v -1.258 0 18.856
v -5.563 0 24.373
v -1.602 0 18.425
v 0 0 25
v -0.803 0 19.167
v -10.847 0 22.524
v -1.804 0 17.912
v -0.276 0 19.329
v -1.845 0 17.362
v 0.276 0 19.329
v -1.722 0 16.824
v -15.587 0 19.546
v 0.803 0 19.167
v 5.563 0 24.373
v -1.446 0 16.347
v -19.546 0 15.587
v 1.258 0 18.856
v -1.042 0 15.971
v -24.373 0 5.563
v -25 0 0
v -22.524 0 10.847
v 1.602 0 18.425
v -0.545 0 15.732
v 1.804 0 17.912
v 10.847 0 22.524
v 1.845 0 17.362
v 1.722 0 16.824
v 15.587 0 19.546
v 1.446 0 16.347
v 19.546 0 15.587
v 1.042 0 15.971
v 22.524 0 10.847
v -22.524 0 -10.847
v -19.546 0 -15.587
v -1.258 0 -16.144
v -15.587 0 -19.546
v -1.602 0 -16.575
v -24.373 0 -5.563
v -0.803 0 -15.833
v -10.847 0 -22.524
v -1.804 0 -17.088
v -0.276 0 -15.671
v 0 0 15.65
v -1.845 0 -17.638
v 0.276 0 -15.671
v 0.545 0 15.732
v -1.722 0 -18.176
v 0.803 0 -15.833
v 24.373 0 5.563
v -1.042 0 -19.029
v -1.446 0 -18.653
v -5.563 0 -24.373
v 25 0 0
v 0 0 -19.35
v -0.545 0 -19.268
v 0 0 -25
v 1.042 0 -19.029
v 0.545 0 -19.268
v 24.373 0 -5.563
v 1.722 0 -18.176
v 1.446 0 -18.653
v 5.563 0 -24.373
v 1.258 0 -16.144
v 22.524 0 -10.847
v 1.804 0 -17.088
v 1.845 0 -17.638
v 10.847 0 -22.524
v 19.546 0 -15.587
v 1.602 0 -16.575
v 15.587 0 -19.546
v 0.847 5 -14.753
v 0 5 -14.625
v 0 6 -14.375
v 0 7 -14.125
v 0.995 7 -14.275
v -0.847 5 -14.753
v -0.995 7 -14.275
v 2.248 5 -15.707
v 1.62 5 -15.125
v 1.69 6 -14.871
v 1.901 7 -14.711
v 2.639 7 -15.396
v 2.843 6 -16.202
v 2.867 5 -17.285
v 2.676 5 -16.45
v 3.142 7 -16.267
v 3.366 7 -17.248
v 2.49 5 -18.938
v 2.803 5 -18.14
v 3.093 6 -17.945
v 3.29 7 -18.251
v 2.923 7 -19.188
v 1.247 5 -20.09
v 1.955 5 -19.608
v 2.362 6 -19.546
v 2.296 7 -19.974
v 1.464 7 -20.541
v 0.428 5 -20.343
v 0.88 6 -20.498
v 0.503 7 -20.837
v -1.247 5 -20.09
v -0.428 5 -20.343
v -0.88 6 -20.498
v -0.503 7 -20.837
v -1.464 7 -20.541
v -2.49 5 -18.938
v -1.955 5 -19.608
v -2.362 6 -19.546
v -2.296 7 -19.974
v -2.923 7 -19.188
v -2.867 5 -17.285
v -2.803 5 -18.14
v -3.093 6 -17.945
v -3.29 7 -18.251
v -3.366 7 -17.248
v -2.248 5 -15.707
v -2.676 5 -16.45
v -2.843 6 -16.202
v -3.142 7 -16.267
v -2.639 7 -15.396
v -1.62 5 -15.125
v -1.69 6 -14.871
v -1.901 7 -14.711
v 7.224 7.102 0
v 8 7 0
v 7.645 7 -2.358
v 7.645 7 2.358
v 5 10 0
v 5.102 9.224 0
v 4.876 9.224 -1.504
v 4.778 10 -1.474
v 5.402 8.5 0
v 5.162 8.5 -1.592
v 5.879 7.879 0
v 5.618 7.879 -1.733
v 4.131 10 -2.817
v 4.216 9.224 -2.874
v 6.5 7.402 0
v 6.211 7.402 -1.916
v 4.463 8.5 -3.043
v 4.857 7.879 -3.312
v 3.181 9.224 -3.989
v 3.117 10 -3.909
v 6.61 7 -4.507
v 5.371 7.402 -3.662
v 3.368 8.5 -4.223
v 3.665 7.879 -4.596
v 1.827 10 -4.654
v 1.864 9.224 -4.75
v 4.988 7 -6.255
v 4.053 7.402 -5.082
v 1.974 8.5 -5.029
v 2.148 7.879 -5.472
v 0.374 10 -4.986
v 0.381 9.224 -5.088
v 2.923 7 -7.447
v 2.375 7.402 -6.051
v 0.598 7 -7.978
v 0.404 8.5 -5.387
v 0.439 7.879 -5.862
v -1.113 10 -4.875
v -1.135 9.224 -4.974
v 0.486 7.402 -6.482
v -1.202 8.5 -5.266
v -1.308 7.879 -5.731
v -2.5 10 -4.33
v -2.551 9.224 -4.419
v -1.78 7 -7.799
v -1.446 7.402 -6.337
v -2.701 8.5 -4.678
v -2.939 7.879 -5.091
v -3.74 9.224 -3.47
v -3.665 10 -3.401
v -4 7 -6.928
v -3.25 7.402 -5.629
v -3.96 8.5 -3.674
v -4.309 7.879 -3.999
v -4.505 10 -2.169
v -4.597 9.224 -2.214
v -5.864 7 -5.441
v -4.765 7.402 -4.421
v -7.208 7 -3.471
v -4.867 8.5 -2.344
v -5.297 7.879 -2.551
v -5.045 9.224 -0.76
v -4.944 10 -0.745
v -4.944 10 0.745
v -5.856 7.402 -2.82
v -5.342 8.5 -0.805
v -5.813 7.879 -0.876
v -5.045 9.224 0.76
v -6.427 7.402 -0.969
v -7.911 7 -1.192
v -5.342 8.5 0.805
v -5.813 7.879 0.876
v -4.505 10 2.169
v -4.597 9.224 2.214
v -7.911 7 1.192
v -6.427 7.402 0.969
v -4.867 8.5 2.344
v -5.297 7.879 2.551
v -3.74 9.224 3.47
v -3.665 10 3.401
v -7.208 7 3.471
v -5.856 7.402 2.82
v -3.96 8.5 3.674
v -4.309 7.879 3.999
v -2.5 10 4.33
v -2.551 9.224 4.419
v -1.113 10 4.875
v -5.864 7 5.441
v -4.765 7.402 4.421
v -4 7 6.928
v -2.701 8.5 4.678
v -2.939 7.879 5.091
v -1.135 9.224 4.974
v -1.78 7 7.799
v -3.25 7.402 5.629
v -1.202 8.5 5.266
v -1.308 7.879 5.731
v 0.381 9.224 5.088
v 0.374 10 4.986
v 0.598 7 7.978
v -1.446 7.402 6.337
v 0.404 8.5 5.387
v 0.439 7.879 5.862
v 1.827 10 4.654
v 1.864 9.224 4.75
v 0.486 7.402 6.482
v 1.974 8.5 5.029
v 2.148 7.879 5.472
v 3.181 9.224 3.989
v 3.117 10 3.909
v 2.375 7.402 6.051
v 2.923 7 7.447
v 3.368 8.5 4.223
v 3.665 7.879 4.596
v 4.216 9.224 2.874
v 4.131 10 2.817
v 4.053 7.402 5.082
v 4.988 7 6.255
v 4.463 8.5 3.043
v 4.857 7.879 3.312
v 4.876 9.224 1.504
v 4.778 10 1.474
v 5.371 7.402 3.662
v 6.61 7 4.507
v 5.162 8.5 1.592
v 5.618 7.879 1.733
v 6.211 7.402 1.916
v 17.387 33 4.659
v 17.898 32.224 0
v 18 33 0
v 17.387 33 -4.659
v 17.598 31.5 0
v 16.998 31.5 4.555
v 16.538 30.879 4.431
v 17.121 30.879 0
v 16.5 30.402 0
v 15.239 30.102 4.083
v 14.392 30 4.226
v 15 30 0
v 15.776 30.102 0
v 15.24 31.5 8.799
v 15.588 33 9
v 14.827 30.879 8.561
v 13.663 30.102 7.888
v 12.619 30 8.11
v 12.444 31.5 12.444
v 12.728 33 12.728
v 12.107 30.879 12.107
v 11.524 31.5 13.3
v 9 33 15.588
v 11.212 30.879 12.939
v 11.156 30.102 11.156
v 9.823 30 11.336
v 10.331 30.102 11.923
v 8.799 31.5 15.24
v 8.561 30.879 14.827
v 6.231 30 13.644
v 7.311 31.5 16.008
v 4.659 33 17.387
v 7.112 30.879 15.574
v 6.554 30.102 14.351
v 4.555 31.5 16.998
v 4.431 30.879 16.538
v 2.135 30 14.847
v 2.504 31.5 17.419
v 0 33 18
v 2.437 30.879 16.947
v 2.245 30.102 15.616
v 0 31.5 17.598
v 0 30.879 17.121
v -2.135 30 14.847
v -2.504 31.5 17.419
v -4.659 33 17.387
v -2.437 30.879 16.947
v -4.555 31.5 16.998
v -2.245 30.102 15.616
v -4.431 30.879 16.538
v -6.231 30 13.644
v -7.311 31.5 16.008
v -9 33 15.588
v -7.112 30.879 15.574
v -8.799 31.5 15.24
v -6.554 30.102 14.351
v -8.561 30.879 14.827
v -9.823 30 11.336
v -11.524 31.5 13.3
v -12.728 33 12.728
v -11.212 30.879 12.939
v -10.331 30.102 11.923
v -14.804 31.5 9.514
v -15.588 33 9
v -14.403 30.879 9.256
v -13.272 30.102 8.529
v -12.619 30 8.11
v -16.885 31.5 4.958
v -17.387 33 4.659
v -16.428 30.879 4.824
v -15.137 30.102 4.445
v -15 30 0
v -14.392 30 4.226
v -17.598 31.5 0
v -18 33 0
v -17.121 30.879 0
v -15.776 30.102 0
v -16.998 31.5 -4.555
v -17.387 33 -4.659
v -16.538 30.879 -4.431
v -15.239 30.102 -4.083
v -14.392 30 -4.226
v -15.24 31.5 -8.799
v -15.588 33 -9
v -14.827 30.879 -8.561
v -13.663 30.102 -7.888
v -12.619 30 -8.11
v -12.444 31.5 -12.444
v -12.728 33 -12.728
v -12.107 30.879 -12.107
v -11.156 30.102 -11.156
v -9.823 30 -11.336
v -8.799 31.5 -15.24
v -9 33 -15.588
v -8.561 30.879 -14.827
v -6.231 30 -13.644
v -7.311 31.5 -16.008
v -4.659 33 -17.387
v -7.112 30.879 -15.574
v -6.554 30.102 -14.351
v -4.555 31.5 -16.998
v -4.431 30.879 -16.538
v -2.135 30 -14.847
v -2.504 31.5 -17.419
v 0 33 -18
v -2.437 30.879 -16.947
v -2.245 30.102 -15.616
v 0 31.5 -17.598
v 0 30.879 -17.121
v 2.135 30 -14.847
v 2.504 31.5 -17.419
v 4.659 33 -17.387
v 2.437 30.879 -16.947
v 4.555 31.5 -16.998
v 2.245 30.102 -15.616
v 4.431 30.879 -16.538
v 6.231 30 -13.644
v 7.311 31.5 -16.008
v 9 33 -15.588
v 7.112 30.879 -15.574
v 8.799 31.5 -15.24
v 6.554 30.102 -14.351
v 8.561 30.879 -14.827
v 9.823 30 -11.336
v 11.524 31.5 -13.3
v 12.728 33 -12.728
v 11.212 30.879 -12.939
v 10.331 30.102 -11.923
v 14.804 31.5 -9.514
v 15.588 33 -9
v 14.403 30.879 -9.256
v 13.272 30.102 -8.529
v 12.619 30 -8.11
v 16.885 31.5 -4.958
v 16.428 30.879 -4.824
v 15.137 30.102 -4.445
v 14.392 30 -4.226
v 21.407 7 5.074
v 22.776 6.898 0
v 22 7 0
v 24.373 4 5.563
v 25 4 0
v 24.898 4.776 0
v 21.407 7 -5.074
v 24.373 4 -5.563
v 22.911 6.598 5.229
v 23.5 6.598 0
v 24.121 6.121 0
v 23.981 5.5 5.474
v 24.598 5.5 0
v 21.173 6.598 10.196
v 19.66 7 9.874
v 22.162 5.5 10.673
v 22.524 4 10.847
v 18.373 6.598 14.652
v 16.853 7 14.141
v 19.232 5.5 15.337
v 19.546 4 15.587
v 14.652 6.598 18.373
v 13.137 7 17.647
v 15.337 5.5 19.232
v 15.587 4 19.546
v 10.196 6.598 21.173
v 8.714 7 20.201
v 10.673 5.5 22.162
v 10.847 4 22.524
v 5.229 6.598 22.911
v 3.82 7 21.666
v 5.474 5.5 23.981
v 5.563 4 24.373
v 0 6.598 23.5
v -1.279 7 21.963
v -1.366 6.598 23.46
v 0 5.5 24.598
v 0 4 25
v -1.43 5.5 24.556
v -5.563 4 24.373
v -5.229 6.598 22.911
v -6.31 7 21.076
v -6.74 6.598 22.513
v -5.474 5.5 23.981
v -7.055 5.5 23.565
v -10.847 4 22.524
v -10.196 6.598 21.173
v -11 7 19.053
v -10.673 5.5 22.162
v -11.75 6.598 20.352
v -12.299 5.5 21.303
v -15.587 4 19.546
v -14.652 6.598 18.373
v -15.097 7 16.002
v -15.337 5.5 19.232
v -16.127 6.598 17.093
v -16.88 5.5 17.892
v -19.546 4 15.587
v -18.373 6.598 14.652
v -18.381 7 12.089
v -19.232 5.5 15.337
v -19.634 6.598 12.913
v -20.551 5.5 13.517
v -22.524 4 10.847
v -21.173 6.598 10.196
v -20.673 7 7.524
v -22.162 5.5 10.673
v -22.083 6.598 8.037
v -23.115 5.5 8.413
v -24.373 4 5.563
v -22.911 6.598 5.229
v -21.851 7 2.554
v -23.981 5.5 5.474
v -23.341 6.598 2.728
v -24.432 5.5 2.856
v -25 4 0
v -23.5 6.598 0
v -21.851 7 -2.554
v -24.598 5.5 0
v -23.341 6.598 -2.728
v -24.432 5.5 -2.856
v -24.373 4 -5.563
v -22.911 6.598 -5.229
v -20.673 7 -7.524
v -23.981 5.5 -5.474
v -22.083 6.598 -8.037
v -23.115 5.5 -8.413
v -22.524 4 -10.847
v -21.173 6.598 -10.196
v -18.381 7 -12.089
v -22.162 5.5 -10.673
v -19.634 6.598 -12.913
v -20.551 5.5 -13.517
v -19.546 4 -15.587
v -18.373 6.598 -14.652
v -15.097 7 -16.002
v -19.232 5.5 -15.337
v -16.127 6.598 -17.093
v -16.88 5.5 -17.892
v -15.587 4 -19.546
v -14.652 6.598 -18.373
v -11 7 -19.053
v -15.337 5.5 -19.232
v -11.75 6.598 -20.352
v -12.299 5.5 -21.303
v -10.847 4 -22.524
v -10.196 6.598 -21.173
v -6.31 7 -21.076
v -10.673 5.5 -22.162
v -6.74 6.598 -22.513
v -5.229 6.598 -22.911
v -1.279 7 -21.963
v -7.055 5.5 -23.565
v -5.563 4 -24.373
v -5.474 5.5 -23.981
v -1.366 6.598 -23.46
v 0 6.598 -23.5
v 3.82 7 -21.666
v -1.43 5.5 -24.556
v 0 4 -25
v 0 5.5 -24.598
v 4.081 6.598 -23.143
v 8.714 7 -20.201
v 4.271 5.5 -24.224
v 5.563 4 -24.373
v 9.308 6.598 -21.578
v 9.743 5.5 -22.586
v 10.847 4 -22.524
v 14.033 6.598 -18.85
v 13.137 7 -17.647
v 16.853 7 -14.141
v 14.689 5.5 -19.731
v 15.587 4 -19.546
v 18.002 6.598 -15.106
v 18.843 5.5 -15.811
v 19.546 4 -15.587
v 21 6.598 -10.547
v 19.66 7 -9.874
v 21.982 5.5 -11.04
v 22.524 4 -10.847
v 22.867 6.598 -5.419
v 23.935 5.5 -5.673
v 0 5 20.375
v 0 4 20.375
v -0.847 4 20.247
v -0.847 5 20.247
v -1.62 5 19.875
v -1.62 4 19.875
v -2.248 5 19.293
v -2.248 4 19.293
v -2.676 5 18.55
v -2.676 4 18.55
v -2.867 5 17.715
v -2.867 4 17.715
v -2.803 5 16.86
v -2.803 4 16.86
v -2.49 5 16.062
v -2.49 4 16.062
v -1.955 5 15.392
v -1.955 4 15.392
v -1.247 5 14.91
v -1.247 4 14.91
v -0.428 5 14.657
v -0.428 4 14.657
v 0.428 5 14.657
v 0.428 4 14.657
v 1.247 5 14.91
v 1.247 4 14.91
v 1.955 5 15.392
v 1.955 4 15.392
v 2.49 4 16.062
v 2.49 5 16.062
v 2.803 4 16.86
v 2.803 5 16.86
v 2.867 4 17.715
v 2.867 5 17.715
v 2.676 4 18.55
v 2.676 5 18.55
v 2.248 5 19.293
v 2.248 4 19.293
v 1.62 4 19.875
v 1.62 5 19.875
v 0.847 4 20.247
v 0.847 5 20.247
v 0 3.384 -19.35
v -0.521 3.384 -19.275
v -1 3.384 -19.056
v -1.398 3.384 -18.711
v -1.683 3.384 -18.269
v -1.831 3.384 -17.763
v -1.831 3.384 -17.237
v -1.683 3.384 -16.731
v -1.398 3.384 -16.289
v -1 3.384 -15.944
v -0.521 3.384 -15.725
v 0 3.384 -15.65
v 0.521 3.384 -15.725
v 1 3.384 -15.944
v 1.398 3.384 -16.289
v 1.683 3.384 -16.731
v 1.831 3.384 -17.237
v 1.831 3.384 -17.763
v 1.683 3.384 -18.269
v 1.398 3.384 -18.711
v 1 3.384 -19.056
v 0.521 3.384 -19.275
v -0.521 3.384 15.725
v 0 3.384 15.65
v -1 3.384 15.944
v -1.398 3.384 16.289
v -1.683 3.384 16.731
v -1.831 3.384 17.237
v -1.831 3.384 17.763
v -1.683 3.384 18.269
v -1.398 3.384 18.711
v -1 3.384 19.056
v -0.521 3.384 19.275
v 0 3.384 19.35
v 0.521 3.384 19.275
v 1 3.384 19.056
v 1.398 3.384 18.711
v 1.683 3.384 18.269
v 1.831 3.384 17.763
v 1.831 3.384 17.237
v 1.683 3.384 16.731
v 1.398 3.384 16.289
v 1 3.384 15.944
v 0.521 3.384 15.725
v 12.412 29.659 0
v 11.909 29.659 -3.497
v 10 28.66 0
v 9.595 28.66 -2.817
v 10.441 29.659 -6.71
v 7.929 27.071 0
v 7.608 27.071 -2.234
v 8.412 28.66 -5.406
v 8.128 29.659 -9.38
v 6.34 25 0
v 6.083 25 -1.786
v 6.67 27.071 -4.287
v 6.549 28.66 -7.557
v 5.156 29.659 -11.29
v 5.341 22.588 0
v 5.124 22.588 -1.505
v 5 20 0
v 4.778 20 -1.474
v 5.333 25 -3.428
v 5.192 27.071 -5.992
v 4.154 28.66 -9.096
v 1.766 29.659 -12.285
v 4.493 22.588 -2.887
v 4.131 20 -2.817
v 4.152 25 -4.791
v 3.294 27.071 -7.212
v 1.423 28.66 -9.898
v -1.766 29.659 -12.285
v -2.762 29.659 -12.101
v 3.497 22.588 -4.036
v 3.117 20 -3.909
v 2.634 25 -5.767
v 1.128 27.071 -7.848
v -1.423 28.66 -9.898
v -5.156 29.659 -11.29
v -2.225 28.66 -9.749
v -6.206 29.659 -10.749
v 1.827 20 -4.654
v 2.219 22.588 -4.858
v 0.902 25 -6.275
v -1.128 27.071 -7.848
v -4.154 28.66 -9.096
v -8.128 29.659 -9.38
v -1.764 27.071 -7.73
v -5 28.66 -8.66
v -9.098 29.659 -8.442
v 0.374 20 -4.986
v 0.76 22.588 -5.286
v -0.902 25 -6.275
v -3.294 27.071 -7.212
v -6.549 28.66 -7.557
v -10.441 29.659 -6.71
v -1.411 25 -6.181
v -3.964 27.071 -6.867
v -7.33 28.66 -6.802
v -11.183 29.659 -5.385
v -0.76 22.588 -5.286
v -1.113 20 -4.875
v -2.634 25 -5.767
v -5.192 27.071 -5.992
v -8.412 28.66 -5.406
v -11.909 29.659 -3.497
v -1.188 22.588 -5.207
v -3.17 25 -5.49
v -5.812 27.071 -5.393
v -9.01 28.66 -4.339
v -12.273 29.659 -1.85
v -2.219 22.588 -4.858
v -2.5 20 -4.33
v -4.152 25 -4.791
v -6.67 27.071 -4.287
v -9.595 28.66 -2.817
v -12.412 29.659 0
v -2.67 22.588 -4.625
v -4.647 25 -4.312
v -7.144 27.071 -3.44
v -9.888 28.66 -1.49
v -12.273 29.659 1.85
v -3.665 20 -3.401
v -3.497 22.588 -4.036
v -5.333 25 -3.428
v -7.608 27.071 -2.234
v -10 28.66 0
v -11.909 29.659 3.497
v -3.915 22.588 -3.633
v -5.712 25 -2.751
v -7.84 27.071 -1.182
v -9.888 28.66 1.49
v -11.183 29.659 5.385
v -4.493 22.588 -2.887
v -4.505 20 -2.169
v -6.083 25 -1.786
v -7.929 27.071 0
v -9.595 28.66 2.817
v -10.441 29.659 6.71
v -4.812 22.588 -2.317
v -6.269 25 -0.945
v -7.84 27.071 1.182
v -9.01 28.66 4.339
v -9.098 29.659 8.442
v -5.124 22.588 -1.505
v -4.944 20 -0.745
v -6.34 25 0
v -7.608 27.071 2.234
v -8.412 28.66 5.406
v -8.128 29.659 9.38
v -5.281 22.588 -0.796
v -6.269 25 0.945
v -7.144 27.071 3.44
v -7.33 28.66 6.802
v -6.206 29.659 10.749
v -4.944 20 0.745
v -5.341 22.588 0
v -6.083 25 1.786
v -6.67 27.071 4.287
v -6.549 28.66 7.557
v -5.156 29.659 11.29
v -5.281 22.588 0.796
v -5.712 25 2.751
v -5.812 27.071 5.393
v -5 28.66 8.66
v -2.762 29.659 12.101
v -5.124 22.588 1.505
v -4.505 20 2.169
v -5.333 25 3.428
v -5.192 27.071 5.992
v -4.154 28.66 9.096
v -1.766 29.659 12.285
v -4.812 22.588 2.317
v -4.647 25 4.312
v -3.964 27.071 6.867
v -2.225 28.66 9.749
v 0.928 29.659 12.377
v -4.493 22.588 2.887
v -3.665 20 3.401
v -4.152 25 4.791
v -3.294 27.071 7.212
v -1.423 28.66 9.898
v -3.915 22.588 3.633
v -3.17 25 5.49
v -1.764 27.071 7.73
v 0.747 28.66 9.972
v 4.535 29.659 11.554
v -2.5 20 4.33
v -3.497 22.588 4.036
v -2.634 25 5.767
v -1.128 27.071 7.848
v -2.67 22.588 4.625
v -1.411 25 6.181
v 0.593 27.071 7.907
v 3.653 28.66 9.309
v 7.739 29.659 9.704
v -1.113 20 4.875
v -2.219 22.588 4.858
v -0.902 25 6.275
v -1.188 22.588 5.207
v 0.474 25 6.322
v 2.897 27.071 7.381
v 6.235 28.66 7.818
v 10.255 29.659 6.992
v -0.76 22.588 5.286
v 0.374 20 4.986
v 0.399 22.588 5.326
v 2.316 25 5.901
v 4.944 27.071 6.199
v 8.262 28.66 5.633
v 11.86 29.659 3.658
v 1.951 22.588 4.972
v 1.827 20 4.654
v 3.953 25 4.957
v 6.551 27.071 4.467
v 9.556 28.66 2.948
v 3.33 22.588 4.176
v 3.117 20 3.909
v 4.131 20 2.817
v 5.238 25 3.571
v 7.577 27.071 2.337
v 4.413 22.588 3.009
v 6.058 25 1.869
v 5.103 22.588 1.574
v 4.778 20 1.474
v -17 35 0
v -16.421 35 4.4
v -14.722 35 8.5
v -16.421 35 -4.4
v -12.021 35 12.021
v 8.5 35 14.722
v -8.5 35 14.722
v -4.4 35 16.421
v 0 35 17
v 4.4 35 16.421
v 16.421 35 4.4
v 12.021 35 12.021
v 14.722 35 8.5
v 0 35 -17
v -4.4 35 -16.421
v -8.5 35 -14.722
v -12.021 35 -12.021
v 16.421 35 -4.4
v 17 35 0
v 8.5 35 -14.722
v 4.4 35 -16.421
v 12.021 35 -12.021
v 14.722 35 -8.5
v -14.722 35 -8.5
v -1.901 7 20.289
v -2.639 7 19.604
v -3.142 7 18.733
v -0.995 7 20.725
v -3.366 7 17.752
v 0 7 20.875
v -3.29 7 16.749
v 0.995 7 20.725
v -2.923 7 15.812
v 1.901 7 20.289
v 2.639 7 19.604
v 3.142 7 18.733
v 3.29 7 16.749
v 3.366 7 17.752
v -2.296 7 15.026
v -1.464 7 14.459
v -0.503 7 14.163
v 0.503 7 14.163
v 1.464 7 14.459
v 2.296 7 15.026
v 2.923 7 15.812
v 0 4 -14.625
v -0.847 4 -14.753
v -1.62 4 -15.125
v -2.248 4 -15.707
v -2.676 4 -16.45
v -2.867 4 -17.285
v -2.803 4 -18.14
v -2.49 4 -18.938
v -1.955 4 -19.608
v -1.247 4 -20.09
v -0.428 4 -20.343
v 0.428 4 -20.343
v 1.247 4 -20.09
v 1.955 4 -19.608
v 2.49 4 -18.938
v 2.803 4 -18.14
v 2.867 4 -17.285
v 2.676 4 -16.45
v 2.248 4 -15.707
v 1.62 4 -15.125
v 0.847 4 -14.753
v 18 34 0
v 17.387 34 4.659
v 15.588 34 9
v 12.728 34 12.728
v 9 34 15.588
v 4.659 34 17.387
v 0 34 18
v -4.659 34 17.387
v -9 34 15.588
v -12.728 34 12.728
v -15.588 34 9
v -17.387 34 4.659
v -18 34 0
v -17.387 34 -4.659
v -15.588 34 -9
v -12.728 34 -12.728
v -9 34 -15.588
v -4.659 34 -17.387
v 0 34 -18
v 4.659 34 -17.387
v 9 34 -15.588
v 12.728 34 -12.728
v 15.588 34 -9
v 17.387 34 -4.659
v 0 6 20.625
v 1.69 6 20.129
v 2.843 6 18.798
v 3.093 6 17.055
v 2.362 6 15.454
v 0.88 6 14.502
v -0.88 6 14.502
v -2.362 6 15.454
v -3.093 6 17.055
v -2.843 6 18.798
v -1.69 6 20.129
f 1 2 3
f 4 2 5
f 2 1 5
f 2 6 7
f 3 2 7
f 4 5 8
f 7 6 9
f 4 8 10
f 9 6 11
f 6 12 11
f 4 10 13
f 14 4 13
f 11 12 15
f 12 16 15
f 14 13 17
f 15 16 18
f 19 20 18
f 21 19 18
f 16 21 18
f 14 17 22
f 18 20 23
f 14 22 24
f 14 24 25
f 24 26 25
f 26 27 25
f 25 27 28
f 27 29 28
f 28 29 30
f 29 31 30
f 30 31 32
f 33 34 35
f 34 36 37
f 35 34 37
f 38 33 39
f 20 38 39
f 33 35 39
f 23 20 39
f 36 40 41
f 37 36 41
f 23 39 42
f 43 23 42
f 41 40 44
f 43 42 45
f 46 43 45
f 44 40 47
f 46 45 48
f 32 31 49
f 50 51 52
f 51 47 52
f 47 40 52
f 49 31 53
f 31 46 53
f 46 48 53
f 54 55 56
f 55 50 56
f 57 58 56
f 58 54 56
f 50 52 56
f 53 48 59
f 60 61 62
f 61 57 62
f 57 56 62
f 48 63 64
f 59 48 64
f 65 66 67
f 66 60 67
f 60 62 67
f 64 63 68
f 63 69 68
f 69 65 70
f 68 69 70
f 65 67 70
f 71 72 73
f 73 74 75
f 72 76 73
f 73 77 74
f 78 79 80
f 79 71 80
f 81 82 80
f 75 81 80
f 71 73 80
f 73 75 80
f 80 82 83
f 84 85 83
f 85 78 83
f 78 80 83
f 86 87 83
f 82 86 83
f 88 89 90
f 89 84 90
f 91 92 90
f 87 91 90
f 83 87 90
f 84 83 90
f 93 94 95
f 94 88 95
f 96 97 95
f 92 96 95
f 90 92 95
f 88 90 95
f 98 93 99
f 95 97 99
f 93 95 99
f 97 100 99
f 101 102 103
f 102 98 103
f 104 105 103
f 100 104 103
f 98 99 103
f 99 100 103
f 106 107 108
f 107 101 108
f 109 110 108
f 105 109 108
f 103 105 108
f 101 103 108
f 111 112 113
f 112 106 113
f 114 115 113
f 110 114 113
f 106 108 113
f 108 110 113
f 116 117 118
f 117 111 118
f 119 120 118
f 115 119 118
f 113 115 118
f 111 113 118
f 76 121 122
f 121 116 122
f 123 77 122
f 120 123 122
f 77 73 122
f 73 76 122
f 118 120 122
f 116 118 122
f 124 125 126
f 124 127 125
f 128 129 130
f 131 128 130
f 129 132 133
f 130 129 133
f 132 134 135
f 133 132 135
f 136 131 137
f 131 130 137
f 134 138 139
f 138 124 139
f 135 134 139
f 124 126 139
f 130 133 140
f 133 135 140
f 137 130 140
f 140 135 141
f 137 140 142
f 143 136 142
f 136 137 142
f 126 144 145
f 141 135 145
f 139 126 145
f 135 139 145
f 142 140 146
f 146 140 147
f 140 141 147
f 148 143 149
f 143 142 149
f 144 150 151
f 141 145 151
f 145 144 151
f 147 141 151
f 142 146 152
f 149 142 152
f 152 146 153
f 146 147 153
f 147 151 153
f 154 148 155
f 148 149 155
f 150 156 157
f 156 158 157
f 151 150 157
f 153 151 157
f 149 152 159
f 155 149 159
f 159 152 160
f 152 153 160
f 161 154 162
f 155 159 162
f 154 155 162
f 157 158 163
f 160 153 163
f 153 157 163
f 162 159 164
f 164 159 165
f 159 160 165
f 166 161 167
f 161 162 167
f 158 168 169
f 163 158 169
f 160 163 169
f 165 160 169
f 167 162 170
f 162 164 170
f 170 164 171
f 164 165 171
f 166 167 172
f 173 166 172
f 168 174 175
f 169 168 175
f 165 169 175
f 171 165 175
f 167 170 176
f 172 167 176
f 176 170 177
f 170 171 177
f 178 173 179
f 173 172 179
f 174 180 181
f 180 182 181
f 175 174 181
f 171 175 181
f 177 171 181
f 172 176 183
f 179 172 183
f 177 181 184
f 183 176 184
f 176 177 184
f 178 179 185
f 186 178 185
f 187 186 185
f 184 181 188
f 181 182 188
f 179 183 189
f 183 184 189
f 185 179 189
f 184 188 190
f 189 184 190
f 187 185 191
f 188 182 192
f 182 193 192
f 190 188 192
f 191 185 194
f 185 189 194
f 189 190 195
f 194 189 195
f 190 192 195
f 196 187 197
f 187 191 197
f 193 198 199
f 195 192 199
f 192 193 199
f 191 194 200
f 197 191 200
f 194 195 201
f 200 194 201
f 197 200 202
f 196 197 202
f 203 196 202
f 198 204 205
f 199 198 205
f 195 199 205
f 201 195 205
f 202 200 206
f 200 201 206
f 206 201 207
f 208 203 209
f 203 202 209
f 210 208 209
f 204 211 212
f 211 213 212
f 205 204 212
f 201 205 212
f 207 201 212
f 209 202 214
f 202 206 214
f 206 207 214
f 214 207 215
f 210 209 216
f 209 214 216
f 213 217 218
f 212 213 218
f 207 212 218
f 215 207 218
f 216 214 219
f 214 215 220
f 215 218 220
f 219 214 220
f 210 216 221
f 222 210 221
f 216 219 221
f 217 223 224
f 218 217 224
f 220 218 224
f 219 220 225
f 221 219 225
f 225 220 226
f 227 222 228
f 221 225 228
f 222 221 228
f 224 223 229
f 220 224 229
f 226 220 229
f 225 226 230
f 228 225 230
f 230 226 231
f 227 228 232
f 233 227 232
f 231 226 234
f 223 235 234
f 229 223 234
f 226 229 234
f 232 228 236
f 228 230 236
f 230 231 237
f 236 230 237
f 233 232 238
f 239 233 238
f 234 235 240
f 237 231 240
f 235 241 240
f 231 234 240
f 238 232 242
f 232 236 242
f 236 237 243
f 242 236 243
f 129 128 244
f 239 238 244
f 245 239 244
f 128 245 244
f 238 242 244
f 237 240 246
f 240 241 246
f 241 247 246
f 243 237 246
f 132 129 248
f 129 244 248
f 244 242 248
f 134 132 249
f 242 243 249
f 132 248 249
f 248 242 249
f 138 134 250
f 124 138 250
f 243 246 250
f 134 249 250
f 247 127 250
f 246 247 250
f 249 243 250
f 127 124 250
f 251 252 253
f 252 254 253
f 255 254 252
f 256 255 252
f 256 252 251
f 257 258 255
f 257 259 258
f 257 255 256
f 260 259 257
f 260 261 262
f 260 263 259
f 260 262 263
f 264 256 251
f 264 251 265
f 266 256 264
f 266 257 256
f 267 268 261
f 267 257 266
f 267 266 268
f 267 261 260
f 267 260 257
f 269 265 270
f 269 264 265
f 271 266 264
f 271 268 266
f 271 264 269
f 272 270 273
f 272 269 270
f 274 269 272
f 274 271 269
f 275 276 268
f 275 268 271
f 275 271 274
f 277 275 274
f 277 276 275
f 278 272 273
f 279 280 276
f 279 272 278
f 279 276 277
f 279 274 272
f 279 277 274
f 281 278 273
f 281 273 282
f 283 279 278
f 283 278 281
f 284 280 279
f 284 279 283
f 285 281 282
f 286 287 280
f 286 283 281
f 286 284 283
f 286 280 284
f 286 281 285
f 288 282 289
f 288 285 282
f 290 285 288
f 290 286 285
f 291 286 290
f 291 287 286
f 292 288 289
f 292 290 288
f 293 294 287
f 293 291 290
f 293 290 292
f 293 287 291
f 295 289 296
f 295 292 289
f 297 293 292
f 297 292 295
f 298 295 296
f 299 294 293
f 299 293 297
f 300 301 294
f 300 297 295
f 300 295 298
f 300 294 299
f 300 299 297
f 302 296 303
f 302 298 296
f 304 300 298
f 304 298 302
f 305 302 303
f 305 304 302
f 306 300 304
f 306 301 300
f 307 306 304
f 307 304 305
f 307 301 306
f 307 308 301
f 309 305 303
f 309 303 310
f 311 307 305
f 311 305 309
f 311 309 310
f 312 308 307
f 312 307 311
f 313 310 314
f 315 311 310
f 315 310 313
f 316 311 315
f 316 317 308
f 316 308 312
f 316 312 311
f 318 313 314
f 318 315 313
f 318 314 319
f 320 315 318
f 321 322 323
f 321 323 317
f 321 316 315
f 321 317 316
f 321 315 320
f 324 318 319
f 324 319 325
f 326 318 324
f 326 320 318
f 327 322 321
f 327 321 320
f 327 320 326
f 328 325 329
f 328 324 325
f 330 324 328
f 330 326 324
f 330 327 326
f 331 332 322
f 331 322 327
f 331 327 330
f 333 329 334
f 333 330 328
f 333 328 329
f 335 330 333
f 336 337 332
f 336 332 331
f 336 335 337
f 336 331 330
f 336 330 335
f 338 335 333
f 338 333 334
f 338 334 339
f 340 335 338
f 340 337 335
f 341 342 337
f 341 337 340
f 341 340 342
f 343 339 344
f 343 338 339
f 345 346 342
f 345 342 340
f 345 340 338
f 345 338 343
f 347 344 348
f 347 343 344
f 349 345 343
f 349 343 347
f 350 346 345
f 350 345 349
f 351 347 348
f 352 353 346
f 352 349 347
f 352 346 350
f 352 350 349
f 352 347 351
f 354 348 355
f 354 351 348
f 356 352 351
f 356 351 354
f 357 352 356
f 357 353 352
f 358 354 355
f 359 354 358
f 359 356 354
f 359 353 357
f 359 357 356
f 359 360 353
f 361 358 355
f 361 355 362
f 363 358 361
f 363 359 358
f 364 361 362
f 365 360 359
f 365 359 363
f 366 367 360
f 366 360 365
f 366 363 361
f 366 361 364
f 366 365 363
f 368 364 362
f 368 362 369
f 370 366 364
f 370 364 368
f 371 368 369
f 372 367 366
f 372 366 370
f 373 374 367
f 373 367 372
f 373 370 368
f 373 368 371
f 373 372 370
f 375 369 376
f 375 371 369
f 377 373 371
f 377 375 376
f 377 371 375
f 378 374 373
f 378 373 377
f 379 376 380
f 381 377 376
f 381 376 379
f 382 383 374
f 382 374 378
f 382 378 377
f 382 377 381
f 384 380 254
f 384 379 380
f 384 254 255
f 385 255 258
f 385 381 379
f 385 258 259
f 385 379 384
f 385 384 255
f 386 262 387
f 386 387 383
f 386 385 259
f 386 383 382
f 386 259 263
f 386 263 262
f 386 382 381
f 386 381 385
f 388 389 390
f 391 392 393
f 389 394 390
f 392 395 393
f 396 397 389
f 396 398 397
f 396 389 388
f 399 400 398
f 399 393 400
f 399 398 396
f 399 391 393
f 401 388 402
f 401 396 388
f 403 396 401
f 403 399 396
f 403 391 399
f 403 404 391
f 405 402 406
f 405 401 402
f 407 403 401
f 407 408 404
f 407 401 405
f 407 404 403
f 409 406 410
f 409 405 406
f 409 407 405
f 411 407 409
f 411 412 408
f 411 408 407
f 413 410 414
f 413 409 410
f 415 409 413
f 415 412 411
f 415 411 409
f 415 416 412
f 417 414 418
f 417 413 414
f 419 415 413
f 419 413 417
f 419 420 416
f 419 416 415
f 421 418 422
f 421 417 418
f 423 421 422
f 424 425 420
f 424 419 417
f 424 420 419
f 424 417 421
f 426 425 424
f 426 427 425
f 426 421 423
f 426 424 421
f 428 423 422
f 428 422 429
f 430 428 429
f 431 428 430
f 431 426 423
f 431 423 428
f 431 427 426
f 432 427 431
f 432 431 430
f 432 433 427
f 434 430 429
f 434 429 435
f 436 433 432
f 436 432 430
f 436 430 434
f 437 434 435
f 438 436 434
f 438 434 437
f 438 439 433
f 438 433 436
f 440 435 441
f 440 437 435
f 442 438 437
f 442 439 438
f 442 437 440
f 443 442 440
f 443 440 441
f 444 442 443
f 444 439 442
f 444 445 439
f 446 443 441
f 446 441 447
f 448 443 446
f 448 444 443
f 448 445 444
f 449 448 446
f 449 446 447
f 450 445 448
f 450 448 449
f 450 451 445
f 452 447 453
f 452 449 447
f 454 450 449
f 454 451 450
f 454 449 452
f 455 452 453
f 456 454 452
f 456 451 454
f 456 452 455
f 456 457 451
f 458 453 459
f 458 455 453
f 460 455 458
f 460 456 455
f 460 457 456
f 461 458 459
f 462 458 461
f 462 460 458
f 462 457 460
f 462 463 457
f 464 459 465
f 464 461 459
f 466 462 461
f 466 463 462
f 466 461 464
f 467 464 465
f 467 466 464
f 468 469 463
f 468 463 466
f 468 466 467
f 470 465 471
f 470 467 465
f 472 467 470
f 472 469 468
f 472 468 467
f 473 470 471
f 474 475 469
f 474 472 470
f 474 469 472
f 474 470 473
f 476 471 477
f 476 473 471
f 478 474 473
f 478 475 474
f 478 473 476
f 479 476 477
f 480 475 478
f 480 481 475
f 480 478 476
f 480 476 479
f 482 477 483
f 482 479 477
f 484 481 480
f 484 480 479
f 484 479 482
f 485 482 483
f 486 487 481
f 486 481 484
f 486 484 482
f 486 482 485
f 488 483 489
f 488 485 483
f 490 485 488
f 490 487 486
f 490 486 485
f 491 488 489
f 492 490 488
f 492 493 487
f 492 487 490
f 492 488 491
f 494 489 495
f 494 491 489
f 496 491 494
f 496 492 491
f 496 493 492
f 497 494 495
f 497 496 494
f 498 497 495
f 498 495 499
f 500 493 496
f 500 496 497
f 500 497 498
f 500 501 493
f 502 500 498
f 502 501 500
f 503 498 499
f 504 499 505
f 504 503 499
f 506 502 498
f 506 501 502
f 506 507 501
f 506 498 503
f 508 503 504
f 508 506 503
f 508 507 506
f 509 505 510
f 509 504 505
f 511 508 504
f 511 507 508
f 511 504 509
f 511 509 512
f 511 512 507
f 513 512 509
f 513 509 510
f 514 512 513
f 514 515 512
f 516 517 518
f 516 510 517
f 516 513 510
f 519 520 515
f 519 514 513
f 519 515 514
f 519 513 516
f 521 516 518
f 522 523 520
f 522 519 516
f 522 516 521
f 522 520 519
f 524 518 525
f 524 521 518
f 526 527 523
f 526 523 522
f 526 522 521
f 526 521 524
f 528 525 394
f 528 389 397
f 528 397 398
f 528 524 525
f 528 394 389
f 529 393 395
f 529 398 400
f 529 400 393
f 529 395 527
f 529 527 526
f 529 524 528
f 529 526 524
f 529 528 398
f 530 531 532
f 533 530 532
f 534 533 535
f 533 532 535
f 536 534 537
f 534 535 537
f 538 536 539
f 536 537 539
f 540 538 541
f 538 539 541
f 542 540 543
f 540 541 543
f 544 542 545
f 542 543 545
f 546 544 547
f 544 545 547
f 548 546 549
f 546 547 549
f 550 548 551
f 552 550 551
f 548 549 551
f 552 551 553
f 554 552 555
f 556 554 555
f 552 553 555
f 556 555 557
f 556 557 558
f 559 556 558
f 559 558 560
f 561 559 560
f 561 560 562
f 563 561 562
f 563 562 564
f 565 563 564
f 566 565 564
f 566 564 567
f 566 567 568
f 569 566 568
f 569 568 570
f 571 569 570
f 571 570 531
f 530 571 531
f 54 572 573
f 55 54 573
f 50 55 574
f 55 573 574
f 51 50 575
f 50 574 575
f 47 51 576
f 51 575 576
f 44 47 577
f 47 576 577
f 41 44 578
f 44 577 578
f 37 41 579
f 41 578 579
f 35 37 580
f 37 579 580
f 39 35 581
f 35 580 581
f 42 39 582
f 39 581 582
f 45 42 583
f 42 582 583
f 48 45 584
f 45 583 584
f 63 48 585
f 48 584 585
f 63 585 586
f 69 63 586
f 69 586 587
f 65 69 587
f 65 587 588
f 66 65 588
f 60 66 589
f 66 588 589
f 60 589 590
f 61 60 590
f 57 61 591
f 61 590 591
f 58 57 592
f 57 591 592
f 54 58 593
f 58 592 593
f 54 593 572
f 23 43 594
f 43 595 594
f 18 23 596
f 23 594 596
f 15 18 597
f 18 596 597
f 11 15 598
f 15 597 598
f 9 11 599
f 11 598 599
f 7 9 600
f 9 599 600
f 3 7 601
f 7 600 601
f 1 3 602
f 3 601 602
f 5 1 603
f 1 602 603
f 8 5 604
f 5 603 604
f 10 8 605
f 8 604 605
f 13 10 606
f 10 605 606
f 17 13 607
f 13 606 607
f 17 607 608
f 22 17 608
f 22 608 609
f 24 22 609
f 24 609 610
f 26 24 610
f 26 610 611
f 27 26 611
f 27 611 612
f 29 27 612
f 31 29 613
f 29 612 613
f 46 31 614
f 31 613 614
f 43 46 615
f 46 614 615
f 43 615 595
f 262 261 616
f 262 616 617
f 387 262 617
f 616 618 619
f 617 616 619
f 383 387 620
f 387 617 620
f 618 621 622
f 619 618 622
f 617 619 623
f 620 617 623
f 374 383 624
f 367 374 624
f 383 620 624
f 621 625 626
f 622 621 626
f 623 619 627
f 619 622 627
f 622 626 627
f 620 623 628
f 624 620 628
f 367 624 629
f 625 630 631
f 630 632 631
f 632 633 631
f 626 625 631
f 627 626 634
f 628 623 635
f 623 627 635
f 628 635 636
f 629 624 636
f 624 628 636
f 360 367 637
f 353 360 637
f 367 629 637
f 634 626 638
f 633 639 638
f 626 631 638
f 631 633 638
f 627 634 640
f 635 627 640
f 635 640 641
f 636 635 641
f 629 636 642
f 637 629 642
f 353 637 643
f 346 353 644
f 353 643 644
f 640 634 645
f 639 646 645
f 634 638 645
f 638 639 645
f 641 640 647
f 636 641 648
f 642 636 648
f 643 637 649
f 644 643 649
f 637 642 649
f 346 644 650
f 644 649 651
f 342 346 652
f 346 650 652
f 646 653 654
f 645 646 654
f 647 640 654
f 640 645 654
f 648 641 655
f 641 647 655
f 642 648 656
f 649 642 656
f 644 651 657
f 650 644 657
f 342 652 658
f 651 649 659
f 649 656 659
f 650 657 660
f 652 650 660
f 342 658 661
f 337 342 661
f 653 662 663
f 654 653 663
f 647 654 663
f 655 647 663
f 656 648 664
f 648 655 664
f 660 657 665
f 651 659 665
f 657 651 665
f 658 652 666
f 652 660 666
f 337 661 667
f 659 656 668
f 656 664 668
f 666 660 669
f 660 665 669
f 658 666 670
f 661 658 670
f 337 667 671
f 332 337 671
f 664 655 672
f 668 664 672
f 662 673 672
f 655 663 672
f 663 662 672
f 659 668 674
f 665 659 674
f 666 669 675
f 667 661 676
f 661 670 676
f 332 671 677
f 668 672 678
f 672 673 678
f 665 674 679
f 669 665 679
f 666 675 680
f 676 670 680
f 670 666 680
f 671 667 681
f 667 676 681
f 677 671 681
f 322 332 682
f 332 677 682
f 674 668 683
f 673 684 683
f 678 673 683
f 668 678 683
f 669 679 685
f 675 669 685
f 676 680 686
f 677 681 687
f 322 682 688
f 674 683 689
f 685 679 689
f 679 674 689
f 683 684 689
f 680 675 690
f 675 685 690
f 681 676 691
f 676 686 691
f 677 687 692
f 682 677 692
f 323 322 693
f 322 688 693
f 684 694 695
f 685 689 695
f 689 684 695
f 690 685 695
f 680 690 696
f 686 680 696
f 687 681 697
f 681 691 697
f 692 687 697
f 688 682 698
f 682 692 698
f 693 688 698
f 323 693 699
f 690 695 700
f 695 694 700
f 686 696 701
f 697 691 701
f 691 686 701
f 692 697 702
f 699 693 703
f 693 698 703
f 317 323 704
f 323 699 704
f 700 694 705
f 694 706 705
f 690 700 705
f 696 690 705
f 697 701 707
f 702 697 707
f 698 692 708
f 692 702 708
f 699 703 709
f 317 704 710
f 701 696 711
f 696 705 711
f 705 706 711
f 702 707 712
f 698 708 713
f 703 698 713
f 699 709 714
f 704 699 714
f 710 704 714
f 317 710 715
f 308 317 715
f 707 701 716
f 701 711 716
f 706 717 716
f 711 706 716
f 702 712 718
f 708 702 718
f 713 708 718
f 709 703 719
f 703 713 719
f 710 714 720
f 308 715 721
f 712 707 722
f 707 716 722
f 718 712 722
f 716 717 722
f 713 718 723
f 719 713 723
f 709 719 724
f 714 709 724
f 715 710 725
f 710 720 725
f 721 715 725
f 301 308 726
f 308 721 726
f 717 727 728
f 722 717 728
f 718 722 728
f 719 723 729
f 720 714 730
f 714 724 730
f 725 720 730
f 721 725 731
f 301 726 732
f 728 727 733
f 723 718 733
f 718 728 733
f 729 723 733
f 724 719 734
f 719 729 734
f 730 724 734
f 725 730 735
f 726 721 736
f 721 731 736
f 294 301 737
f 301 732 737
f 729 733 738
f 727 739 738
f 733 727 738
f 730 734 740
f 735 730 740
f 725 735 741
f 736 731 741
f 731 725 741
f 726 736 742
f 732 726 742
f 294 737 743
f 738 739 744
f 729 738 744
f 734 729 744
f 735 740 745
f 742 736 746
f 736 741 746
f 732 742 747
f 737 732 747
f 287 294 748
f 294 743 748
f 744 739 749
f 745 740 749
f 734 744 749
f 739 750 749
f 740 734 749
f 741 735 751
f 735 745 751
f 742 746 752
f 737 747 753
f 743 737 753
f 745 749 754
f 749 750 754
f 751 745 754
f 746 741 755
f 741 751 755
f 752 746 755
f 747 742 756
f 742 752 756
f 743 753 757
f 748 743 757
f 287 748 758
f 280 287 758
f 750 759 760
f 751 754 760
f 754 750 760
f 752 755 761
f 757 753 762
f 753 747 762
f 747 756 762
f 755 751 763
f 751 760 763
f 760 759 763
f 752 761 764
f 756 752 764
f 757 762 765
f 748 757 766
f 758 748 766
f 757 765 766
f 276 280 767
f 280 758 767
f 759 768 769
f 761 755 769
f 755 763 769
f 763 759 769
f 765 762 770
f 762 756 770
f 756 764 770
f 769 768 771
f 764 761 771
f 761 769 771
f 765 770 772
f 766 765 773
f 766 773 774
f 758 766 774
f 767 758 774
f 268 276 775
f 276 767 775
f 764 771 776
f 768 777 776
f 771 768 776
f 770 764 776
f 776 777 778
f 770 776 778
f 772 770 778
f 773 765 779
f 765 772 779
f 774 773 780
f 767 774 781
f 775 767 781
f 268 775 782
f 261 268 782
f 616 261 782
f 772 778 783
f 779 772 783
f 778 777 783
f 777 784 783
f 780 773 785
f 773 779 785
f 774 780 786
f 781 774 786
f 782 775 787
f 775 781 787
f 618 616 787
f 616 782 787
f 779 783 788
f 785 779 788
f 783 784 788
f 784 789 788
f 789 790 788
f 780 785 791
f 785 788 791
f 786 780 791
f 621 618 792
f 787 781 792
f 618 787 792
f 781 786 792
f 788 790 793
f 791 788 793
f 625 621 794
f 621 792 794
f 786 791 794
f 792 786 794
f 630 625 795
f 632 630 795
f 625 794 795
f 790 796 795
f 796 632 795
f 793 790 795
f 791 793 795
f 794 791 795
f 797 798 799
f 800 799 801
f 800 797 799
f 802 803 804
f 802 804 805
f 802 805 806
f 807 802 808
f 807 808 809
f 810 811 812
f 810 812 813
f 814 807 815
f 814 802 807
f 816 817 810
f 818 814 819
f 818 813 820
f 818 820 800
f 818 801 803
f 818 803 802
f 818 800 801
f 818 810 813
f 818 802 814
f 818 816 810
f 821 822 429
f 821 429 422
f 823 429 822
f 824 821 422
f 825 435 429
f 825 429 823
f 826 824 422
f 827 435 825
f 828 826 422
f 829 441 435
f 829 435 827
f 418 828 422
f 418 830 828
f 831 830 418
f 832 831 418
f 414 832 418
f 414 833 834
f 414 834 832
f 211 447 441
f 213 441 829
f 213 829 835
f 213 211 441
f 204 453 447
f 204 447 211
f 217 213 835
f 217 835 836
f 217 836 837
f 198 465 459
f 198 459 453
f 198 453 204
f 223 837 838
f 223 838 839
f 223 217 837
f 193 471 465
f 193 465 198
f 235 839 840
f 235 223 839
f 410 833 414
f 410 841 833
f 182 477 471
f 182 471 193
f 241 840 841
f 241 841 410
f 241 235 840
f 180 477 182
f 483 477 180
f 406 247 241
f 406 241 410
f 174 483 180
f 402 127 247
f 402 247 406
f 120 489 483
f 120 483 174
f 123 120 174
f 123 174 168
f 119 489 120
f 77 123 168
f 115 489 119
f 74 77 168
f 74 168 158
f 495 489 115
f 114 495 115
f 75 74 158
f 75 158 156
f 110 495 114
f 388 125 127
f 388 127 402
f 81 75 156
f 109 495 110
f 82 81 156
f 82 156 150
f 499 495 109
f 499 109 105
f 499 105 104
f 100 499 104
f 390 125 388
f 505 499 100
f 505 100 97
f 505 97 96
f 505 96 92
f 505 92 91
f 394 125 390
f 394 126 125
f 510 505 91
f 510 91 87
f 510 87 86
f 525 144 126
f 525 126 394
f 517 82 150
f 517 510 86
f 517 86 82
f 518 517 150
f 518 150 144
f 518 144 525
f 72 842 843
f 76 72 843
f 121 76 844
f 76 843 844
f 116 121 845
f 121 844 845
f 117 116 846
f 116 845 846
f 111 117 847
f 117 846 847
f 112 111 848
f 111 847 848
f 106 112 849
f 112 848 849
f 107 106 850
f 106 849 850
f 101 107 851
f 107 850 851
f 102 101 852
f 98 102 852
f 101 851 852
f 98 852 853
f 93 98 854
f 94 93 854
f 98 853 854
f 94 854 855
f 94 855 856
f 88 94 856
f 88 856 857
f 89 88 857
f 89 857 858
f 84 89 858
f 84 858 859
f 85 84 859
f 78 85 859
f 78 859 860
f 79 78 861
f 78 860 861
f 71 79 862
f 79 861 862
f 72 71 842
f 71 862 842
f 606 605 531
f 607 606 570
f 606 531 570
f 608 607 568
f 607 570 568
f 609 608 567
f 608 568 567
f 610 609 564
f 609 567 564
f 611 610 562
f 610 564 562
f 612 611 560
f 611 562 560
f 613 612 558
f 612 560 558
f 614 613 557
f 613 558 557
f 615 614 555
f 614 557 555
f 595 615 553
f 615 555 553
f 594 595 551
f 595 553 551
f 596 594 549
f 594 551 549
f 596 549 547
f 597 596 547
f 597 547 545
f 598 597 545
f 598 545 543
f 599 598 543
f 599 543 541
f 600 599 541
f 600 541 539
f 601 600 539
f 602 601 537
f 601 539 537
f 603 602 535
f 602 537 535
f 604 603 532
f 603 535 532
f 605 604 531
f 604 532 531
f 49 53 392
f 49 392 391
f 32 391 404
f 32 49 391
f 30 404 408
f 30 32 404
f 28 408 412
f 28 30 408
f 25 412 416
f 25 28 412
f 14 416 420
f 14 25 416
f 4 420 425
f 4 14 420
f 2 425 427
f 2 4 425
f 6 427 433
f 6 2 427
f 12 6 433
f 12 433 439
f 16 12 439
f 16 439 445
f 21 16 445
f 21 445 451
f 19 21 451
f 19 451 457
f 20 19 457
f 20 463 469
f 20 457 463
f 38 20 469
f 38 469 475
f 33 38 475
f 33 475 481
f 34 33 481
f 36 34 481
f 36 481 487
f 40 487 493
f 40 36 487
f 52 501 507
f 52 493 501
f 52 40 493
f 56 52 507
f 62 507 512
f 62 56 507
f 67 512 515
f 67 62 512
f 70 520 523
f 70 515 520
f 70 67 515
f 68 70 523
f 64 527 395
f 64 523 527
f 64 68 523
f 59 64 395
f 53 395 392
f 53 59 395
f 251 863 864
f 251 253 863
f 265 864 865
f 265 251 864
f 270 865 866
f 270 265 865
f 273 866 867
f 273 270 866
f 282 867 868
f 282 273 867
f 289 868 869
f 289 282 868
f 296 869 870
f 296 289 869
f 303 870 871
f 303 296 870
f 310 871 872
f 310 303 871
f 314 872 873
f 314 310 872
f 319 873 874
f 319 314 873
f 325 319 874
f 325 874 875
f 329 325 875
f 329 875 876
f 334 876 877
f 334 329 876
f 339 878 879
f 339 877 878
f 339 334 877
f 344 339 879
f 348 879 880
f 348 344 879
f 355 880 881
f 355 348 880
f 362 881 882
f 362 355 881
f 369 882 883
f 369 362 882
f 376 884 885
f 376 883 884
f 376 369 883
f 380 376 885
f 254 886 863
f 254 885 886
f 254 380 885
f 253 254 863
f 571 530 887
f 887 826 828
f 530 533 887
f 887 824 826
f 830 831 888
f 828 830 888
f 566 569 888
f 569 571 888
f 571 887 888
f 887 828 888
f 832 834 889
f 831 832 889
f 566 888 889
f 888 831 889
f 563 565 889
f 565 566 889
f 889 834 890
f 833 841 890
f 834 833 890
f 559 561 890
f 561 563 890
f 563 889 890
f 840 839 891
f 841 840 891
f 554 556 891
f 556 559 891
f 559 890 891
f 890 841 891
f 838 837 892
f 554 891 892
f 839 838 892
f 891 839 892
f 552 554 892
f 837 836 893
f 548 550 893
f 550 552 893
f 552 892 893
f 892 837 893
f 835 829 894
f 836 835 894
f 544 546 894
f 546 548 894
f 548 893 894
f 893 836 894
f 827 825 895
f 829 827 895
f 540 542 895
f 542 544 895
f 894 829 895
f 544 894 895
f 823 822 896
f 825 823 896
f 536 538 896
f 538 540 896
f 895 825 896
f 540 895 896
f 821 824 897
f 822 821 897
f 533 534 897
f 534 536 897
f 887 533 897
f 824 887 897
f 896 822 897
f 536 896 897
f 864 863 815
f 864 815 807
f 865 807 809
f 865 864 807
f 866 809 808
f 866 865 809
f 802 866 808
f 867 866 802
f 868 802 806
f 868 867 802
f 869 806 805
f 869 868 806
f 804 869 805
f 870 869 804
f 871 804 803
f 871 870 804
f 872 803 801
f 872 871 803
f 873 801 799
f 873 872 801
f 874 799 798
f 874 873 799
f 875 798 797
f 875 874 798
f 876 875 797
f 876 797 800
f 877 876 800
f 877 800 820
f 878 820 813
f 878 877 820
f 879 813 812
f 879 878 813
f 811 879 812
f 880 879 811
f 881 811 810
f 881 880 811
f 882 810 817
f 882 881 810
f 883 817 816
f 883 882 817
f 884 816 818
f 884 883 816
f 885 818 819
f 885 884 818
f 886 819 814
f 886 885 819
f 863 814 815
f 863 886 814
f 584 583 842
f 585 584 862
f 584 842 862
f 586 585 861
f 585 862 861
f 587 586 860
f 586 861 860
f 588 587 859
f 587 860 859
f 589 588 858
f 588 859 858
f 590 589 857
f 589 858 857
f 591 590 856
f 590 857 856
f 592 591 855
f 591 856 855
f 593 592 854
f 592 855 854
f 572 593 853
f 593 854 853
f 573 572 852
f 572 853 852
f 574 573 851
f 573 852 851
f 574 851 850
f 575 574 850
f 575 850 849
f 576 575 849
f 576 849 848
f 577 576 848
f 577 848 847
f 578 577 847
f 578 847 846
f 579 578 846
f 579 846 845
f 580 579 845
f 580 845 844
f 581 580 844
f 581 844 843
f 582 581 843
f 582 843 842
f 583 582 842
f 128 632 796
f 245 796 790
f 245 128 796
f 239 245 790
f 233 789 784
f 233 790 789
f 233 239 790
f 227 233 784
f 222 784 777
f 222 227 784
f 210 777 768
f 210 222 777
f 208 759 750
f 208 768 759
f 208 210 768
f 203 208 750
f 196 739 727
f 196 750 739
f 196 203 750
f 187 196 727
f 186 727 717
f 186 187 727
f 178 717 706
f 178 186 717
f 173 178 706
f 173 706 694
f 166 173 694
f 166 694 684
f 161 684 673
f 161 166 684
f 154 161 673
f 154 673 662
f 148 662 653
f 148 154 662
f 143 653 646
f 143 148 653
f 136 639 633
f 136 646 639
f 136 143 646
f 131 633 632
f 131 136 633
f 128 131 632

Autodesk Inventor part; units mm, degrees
ref_plane "YZ Plane" through (0, 0, 0) normal (1, 0, 0) x (0, 1, 0)
ref_plane "XZ Plane" through (0, 0, 0) normal (0, 1, 0) x (-1, 0, 0)
ref_plane "XY Plane" through (0, 0, 0) normal (0, 0, 1) x (1, 0, 0)
sketch "Sketch2" plane through (0, 0, 0) normal (0, 0, 1) x (1, 0, 0)
  line L0 (0, 0) -> (25, 0)
  line L1 (0, 0) -> (0, 35)
  line L2 (0, 35) -> (18, 35)
  line L3 (18, 35) -> (18, 30)
  line L4 (18, 30) -> (5, 30)
  line L5 (5, 30) -> (5, 7)
  line L6 (5, 7) -> (25, 7)
  line L7 (25, 7) -> (25, 0)
  dimension "d3" = 25
  dimension "d4" = 35
  dimension "d5" = 18
  dimension "d6" = 5
  dimension "d23" = 7
  dimension "d24" = 23
  dimension "d26" = 5
revolve "Revolution1" add sketch "Sketch2" angle 360 about axis through (0, 0, 0) along (0, 1, 0)
fillet "Fillet1" radius 3 3 edges at (-5, 7, 0) (-18, 30, 0) (-25, 7, 0)
chamfer "Chamfer1" distance 1 angle 45 1 edges at (-18, 35, 0)
sketch "Sketch3" plane through (0, 0, 0) normal (0, -1, 0) x (1, 0, 0)
  line L0 (0, 0) -> (0, -17.5)
  line L1 (0, 0) -> (0, 17.5)
  dimension "d14" = 17.5
  dimension "d15" = 17.5
hole "Hole1" at (0, 0, 17.5) at (0, 0, -17.5) direction (0, 1, 0) diameter 3.7 depth 7
fillet "Fillet2" radius 10 1 edges at (-5, 30, 0)
sketch "Sketch4" plane through (0, 7, 0) normal (0, 1, 0) x (1, 0, 0)
  circle A0 centre (0, 17.5) radius 1.85 projected
  circle A1 centre (0, -17.5) radius 1.85 projected
  circle A2 centre (0, -17.5) radius 1.85 projected
  circle A3 centre (0, -17.5) radius 1.85 projected
  point P0 (0, 0)
hole "Hole2" at (0, 7, 17.5) at (0, 7, -17.5) direction (0, -1, 0) diameter 5.75 depth 3 tip angle 118
chamfer "Chamfer2" distance 0.5 distance2 2 1 edges at (0, 7, 14.625) measured on face at (-6.4693, 7, 13.5188)
chamfer "Chamfer3" distance 0.5 distance2 2 1 edges at (0, 7, -20.375) measured on face at (6.4693, 7, -13.5188)
sketch "Sketch5" plane through (0, 0, 0) normal (0, -1, 0) x (1, 0, 0)
  line L0 (-10, -10) -> (-10, 10)
  line L1 (-10, 10) -> (10, 10)
  line L2 (10, 10) -> (10, -10)
  line L3 (10, -10) -> (-10, -10)
  line L4 (-10, -10) -> (10, 10) construction
  line L5 (-10, 10) -> (10, -10) construction
  point P0 (0, 0)
  dimension "d34" = 20
  dimension "d35" = 20
extrude "Extrusion2" [suppressed]
sketch "Sketch7" plane through (0, 0, 0) normal (0, -1, 0) x (1, 0, 0)
  line L0 (-26, -7.75) -> (-10, -7.75)
  line L1 (-10, -7.75) -> (-10, 7.75)
  line L2 (-10, 7.75) -> (-26, 7.75)
  line L3 (-26, 7.75) -> (-26, -7.75)
  circle A0 centre (0, 0) radius 18 projected
  line L4 (-26, -7.75) -> (-10, 7.75) construction
  line L5 (-10, -7.75) -> (-26, 7.75) construction
  point P0 (-18, 0)
  dimension "d44" = 15.5
extrude "Extrusion3" [suppressed]
sketch "Sketch8" plane through (-10, 0, 10) normal (0, -1, 0) x (1, 0, 0)
  arc A0 (35, -10) -> (35, -10) centre (10, -10) ccw projected
  line L0 (-12.5073, 0.8822) -> (-22.2437, 0.8822)
  line L1 (-22.2437, 0.8822) -> (-22.2437, -21.0128)
  line L2 (-22.2437, -21.0128) -> (-12.5073, -21.0128)
  line L3 (-12.5073, -21.0128) -> (-12.4075, -21.0862)
  arc A1 (-12.5073, 0.8822) -> (-12.4075, -21.0862) centre (10, -10) ccw
  point P0 (-13.7684, -17.75)
  point P1 (-13.7684, -2.25)
extrude "Extrusion4" [suppressed]
chamfer "Chamfer4" [suppressed]
fillet "Fillet3" [suppressed]
properties part number "holding_socket"
